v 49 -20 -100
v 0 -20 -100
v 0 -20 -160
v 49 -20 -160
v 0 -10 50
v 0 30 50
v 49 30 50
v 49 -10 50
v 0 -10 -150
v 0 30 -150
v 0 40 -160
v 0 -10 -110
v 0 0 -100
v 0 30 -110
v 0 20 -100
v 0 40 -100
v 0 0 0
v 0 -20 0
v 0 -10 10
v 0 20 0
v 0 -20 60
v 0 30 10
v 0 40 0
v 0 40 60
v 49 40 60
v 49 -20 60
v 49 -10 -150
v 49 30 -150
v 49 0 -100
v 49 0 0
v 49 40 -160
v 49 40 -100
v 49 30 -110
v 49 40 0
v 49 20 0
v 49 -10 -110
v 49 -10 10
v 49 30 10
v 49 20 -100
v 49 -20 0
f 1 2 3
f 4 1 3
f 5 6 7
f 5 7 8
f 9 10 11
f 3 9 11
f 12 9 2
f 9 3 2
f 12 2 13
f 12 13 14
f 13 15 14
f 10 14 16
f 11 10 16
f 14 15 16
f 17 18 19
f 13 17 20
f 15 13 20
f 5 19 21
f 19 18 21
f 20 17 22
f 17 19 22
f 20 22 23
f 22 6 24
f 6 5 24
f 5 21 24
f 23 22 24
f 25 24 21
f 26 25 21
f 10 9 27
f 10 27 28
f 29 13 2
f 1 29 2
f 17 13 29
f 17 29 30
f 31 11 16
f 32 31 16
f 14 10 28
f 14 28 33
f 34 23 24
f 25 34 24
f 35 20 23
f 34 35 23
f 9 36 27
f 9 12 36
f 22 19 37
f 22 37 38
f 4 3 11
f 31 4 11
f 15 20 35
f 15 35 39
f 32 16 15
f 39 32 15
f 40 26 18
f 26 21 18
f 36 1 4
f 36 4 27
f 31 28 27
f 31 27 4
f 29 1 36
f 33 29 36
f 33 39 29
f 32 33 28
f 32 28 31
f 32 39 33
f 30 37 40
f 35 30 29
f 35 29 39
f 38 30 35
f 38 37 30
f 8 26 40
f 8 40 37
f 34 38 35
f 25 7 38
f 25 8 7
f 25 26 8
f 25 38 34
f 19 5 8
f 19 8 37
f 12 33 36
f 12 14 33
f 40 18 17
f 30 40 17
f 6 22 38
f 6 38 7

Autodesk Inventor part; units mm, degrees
ref_plane "YZ Plane" through (0, 0, 0) normal (1, 0, 0) x (0, 1, 0)
ref_plane "XZ Plane" through (0, 0, 0) normal (0, 1, 0) x (-1, 0, 0)
ref_plane "XY Plane" through (0, 0, 0) normal (0, 0, 1) x (1, 0, 0)
sketch "Sketch1" plane through (0, 0, 0) normal (1, 0, 0) x (0, 1, 0)
  point P0 (0, 0)
sketch "Sketch2" plane through (0, 0, 0) normal (1, 0, 0) x (0, 1, 0)
  line L0 (0, 0) -> (20, 0)
  line L1 (20, 0) -> (20, -100)
  line L2 (20, -100) -> (0, -100)
  line L3 (0, -100) -> (0, 0)
  line L4 (40, 60) -> (-20, 60)
  line L5 (-20, 60) -> (-20, 0)
  line L6 (-20, 0) -> (40, 0)
  line L7 (40, 0) -> (40, 60)
  line L8 (40, -100) -> (-20, -100)
  line L9 (-20, -100) -> (-20, -160)
  line L10 (-20, -160) -> (40, -160)
  line L11 (40, -160) -> (40, -100)
  line L12 (30, 50) -> (-10, 50)
  line L13 (-10, 50) -> (-10, 10)
  line L14 (-10, 10) -> (30, 10)
  line L15 (30, 10) -> (30, 50)
  line L16 (30, -110) -> (-10, -110)
  line L17 (-10, -110) -> (-10, -150)
  line L18 (-10, -150) -> (30, -150)
  line L19 (30, -150) -> (30, -110)
  dimension "d0" = 100
  dimension "d1" = 20
  dimension "d2" = 60
  dimension "d3" = 60
  dimension "d4" = 0
  dimension "d5" = 20
  dimension "d6" = 60
  dimension "d7" = 40
  dimension "d8" = 40
  dimension "d9" = 10
  dimension "d10" = 10
  dimension "d11" = 40
  dimension "d12" = 40
  dimension "d13" = 10
  dimension "d14" = 10
extrude "Extrusion1" add sketch "Sketch2" along normal blind 49
properties part number "extenstion"
